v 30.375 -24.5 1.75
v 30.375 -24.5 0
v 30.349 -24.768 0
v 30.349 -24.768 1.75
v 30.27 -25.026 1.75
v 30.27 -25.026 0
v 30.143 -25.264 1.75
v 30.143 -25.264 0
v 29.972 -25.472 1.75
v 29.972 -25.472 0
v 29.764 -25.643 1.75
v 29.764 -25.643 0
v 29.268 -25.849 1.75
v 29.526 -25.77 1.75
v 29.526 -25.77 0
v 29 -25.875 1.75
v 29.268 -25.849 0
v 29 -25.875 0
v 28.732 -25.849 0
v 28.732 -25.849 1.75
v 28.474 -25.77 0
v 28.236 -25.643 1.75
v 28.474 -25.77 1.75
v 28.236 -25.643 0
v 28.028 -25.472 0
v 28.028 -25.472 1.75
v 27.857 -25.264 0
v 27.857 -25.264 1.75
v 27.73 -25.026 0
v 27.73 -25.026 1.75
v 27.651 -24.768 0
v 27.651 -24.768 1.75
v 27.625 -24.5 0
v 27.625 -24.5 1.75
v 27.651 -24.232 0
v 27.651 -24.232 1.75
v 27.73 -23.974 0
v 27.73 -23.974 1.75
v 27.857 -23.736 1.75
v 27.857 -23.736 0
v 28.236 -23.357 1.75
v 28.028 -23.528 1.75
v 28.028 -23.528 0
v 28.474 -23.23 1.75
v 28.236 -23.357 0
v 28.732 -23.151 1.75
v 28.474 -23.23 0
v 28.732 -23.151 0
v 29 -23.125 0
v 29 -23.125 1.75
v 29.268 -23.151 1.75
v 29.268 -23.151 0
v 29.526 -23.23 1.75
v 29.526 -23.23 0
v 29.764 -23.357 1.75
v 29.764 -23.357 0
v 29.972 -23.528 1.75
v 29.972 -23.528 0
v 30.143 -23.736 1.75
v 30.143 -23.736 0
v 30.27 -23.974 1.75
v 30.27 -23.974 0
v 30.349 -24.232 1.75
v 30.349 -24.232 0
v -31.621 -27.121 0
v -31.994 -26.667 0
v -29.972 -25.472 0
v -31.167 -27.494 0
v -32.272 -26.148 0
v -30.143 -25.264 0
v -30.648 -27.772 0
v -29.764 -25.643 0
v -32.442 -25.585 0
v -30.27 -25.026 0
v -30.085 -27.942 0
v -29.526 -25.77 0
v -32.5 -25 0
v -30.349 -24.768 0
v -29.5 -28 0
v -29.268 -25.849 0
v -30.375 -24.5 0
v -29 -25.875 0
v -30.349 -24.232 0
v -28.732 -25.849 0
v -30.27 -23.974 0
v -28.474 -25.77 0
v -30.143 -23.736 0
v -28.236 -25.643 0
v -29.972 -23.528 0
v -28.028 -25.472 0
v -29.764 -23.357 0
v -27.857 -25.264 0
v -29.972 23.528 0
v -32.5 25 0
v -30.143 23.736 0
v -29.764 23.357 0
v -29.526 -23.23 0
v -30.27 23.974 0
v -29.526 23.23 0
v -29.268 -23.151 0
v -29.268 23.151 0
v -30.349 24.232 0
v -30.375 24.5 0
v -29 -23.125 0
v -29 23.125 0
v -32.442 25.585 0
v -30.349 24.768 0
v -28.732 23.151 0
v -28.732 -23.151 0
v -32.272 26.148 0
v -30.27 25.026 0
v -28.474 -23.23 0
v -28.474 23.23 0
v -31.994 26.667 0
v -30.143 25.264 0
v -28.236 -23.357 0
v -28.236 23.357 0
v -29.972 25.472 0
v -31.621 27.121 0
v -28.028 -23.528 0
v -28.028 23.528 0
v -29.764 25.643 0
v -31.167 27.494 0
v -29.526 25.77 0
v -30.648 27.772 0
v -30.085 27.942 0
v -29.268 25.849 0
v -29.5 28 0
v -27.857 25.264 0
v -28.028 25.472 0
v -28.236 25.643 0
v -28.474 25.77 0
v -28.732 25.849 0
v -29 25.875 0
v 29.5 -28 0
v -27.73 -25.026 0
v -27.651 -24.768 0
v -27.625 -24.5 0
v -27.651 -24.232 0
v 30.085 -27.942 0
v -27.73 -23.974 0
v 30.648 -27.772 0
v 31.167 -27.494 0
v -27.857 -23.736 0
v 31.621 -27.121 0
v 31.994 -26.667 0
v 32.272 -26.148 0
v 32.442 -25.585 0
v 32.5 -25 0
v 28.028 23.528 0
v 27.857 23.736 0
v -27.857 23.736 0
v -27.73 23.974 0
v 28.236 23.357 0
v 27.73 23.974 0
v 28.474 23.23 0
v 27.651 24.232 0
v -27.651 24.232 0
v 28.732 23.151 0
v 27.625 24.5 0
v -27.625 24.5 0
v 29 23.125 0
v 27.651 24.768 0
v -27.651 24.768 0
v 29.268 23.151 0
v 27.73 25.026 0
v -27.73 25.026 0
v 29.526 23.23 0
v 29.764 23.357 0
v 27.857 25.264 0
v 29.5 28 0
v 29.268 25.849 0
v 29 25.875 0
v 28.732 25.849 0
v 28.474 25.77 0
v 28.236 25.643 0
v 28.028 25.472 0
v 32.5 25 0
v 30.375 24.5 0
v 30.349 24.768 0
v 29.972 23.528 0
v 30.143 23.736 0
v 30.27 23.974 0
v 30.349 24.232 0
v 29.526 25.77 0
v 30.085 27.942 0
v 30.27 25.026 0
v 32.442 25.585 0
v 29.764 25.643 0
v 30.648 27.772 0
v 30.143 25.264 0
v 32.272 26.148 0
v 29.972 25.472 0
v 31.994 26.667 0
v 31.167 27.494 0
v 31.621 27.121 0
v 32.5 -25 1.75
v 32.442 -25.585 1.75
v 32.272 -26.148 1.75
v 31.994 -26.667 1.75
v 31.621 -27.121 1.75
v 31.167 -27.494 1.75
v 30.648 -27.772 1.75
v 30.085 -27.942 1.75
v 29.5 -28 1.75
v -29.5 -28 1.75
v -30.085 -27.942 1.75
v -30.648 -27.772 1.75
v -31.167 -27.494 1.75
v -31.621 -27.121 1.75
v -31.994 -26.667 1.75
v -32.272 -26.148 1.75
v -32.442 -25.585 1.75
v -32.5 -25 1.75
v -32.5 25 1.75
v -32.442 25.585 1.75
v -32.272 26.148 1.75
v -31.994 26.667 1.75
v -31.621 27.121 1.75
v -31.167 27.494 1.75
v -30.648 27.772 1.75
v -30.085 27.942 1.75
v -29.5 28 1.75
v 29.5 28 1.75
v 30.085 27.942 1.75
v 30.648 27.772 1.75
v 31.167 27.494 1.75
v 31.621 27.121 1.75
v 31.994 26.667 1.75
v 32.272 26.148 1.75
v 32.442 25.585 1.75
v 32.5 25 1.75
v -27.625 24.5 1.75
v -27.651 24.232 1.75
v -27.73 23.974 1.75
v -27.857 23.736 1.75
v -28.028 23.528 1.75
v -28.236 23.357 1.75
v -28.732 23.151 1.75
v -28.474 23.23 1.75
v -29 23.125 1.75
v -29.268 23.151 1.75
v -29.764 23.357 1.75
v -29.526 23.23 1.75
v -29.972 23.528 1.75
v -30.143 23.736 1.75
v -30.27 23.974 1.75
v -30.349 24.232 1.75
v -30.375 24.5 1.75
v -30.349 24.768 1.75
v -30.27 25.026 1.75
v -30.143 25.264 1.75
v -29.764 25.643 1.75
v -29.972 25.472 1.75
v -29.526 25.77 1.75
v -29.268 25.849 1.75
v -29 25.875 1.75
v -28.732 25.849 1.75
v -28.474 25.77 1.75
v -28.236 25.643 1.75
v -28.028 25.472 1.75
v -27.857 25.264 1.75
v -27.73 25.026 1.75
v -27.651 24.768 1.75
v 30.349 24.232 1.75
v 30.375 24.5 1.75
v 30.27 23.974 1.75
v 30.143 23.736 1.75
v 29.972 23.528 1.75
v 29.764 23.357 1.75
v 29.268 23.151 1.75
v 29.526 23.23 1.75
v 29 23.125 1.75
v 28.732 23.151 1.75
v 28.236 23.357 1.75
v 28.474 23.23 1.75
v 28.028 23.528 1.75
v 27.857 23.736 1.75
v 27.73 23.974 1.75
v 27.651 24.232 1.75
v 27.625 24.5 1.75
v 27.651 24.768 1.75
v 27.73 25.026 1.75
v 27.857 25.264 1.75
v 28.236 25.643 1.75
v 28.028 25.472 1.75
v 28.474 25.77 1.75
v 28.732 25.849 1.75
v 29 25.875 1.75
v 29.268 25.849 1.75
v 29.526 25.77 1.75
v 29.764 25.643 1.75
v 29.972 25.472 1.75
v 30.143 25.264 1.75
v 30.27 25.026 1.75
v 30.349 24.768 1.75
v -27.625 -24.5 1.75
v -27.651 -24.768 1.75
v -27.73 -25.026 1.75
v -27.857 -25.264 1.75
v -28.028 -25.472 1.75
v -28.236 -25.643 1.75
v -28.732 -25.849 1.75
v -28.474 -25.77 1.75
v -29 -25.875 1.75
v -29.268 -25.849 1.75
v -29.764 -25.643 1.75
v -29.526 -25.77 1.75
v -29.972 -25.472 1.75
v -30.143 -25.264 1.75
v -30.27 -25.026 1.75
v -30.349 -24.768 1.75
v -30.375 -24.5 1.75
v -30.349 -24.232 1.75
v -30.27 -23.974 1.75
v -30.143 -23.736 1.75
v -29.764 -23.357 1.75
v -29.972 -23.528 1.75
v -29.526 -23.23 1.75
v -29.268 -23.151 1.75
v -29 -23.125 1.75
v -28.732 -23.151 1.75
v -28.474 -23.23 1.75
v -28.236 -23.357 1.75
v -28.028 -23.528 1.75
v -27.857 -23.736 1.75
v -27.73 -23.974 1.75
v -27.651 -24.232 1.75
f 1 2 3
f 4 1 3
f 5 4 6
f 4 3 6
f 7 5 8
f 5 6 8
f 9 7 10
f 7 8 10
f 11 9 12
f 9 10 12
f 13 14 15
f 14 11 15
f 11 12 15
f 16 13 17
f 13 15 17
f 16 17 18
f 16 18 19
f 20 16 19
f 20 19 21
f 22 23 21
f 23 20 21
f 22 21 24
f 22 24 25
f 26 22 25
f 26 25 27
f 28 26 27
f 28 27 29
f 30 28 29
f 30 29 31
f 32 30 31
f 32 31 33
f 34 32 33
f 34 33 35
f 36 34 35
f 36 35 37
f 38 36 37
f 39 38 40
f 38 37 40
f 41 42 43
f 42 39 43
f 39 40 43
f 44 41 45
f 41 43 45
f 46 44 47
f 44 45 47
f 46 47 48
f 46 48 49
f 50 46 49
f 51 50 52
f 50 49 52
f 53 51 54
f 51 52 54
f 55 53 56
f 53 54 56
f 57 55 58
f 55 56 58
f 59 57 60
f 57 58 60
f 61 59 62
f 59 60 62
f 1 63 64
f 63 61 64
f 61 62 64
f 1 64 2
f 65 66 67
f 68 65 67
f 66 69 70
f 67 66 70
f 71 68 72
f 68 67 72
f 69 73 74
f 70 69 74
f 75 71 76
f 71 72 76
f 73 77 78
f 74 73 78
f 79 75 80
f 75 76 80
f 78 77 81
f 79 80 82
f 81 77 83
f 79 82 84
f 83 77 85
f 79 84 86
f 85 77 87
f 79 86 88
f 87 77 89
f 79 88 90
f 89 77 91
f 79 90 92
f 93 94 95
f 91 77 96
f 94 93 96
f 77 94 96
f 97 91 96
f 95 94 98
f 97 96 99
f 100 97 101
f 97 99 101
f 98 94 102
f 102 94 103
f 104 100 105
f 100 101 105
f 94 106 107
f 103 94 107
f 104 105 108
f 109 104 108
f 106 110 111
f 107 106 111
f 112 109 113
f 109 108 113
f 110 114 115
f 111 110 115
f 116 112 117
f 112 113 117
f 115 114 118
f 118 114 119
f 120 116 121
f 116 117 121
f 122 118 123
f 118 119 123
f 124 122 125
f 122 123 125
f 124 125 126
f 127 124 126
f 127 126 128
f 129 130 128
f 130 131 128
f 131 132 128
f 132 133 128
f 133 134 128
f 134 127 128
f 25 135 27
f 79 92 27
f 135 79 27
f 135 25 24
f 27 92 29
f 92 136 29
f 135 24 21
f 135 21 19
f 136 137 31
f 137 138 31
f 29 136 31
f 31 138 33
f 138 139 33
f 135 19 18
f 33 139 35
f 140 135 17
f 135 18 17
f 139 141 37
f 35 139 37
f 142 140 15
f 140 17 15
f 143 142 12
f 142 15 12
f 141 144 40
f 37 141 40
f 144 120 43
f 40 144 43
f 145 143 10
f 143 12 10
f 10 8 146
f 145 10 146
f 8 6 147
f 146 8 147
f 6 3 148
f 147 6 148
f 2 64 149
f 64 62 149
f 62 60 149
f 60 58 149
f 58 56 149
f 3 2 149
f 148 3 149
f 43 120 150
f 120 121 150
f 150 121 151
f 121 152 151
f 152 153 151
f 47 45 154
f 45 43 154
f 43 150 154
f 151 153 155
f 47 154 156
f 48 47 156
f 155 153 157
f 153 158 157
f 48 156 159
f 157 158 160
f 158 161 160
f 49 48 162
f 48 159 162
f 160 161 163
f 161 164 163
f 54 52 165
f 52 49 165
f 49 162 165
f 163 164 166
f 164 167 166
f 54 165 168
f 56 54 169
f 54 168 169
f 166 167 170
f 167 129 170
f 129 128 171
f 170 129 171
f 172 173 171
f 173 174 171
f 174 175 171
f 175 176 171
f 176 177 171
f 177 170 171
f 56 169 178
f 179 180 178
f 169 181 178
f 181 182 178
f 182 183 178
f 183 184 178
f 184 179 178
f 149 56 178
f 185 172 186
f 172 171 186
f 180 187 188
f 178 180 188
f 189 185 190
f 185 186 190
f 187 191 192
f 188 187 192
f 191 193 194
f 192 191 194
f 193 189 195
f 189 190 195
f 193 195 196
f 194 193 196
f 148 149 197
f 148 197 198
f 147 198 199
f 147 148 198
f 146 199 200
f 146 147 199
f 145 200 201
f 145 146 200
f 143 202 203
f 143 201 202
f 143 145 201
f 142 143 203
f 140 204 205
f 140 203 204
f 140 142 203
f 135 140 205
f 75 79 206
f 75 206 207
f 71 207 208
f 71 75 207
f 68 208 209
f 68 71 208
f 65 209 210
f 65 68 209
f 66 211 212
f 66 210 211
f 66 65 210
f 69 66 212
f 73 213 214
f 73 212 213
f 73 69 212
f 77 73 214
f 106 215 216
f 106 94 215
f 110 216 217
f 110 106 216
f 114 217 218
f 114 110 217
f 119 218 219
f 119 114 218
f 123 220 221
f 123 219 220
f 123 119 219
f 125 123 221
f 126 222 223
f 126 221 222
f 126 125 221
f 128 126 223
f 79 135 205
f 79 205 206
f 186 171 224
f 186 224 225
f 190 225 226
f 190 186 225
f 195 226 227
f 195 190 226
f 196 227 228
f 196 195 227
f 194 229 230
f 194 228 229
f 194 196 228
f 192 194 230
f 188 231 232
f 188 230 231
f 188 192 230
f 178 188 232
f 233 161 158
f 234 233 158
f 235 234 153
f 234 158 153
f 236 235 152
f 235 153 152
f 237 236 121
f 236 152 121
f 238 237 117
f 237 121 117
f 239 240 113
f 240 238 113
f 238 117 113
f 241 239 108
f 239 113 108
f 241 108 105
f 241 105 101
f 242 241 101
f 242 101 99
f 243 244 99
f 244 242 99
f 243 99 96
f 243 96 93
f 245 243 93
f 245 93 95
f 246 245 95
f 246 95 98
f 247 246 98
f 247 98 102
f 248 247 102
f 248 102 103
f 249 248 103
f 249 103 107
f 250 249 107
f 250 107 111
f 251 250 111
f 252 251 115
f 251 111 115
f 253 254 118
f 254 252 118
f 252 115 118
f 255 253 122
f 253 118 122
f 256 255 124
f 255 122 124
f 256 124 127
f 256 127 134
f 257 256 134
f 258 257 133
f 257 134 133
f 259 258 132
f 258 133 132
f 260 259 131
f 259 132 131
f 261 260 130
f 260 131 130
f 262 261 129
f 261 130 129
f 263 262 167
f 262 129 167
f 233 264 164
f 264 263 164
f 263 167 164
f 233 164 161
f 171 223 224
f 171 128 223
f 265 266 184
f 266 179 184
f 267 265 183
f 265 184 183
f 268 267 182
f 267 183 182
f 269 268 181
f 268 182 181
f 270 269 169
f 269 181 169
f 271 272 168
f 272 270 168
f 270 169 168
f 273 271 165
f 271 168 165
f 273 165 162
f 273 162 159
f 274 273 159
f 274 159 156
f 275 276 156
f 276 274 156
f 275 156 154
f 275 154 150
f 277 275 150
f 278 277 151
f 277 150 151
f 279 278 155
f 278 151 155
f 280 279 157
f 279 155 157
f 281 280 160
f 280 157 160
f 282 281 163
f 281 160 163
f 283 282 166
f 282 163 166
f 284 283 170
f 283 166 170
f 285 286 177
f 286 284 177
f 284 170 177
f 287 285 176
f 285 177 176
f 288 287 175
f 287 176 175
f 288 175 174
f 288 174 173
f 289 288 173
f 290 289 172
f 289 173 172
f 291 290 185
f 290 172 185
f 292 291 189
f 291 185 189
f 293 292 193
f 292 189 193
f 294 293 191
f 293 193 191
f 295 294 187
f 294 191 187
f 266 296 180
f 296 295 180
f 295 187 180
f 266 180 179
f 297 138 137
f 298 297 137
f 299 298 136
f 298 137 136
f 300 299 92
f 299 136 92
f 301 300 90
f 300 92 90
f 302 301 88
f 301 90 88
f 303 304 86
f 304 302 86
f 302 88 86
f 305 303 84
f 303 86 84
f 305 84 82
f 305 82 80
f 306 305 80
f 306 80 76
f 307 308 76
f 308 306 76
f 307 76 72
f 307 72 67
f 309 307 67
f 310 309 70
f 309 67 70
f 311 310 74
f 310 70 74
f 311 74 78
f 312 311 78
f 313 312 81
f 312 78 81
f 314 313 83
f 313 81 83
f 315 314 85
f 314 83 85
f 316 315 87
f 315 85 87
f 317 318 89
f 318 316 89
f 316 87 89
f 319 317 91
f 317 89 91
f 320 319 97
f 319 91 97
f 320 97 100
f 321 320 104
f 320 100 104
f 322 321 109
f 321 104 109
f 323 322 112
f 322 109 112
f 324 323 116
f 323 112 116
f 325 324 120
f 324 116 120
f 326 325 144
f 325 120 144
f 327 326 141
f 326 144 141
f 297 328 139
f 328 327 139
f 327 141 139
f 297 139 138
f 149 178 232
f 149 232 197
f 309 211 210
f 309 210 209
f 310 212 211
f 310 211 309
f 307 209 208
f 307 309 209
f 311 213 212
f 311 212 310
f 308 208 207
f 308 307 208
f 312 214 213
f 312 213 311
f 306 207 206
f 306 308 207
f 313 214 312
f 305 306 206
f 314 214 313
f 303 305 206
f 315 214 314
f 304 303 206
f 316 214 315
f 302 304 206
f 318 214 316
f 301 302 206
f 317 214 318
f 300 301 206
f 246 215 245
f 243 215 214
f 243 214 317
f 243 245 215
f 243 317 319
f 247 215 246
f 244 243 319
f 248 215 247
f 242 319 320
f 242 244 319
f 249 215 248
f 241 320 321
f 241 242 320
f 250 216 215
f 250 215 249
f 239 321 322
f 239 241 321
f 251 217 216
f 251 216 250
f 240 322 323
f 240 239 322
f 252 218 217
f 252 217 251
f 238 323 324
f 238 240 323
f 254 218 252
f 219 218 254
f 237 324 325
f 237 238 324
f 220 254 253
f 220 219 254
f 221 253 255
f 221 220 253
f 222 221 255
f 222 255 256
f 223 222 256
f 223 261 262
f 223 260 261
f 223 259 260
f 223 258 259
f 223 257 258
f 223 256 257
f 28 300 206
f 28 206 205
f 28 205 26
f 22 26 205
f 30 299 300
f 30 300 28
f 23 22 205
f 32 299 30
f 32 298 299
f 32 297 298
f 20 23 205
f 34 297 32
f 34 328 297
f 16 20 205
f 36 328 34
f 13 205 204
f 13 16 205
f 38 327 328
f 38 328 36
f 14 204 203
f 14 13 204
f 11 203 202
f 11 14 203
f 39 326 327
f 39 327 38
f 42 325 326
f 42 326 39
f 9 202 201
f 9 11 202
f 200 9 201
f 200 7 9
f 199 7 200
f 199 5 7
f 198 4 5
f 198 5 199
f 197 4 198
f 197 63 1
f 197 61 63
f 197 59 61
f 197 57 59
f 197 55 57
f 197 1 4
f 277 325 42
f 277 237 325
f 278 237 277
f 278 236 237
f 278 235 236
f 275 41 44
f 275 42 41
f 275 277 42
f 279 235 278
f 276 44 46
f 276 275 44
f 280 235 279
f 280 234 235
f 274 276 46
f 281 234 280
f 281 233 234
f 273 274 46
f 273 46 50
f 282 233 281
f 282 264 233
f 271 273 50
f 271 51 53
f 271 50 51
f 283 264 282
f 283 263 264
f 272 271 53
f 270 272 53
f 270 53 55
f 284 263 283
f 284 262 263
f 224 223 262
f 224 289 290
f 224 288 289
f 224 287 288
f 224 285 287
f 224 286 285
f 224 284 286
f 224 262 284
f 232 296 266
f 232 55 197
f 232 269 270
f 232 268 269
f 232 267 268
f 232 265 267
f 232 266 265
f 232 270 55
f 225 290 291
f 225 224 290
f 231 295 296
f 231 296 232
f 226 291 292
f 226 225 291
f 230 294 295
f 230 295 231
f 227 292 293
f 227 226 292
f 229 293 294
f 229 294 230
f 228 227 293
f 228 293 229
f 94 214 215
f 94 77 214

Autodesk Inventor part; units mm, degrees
ref_plane "YZ Plane" through (0, 0, 0) normal (1, 0, 0) x (0, 1, 0)
ref_plane "XZ Plane" through (0, 0, 0) normal (0, 1, 0) x (-1, 0, 0)
ref_plane "XY Plane" through (0, 0, 0) normal (0, 0, 1) x (1, 0, 0)
sketch "Skizze1" plane through (0, 0, 0) normal (0, 0, 1) x (1, 0, 0)
  line L0 (-29.5, 28) -> (29.5, 28)
  line L1 (32.5, 25) -> (32.5, -25)
  line L2 (29.5, -28) -> (-29.5, -28)
  line L3 (-32.5, -25) -> (-32.5, 25)
  arc A0 (-29.5, 28) -> (-32.5, 25) centre (-29.5, 25) ccw
  arc A1 (-32.5, -25) -> (-29.5, -28) centre (-29.5, -25) ccw
  arc A2 (29.5, -28) -> (32.5, -25) centre (29.5, -25) ccw
  arc A3 (32.5, 25) -> (29.5, 28) centre (29.5, 25) ccw
  line L4 (-29, 24.5) -> (29, 24.5) construction
  line L5 (29, 24.5) -> (29, -24.5) construction
  line L6 (29, -24.5) -> (-29, -24.5) construction
  line L7 (-29, -24.5) -> (-29, 24.5) construction
  circle A4 centre (-29, 24.5) radius 1.375
  circle A5 centre (29, 24.5) radius 1.375
  circle A6 centre (-29, -24.5) radius 1.375
  circle A7 centre (29, -24.5) radius 1.375
  point P0 (0, 0)
  point P1 (32.5, -28)
  point P2 (32.5, 28)
  point P3 (-32.5, -28)
  point P4 (0, 28)
  point P5 (32.5, 0)
  point P6 (0, 24.5)
  point P7 (29, 0)
  dimension "d0" = 65
  dimension "d1" = 56
  dimension "d2" = 3
  dimension "d3" = 58
  dimension "d4" = 49
  dimension "d5" = 2.75
  dimension "d8" = 58
  dimension "d11" = 49
extrude "Extrusion1" add sketch "Skizze1" along normal blind 1.75
properties part number "Pi Foundation Display Driver Board"
